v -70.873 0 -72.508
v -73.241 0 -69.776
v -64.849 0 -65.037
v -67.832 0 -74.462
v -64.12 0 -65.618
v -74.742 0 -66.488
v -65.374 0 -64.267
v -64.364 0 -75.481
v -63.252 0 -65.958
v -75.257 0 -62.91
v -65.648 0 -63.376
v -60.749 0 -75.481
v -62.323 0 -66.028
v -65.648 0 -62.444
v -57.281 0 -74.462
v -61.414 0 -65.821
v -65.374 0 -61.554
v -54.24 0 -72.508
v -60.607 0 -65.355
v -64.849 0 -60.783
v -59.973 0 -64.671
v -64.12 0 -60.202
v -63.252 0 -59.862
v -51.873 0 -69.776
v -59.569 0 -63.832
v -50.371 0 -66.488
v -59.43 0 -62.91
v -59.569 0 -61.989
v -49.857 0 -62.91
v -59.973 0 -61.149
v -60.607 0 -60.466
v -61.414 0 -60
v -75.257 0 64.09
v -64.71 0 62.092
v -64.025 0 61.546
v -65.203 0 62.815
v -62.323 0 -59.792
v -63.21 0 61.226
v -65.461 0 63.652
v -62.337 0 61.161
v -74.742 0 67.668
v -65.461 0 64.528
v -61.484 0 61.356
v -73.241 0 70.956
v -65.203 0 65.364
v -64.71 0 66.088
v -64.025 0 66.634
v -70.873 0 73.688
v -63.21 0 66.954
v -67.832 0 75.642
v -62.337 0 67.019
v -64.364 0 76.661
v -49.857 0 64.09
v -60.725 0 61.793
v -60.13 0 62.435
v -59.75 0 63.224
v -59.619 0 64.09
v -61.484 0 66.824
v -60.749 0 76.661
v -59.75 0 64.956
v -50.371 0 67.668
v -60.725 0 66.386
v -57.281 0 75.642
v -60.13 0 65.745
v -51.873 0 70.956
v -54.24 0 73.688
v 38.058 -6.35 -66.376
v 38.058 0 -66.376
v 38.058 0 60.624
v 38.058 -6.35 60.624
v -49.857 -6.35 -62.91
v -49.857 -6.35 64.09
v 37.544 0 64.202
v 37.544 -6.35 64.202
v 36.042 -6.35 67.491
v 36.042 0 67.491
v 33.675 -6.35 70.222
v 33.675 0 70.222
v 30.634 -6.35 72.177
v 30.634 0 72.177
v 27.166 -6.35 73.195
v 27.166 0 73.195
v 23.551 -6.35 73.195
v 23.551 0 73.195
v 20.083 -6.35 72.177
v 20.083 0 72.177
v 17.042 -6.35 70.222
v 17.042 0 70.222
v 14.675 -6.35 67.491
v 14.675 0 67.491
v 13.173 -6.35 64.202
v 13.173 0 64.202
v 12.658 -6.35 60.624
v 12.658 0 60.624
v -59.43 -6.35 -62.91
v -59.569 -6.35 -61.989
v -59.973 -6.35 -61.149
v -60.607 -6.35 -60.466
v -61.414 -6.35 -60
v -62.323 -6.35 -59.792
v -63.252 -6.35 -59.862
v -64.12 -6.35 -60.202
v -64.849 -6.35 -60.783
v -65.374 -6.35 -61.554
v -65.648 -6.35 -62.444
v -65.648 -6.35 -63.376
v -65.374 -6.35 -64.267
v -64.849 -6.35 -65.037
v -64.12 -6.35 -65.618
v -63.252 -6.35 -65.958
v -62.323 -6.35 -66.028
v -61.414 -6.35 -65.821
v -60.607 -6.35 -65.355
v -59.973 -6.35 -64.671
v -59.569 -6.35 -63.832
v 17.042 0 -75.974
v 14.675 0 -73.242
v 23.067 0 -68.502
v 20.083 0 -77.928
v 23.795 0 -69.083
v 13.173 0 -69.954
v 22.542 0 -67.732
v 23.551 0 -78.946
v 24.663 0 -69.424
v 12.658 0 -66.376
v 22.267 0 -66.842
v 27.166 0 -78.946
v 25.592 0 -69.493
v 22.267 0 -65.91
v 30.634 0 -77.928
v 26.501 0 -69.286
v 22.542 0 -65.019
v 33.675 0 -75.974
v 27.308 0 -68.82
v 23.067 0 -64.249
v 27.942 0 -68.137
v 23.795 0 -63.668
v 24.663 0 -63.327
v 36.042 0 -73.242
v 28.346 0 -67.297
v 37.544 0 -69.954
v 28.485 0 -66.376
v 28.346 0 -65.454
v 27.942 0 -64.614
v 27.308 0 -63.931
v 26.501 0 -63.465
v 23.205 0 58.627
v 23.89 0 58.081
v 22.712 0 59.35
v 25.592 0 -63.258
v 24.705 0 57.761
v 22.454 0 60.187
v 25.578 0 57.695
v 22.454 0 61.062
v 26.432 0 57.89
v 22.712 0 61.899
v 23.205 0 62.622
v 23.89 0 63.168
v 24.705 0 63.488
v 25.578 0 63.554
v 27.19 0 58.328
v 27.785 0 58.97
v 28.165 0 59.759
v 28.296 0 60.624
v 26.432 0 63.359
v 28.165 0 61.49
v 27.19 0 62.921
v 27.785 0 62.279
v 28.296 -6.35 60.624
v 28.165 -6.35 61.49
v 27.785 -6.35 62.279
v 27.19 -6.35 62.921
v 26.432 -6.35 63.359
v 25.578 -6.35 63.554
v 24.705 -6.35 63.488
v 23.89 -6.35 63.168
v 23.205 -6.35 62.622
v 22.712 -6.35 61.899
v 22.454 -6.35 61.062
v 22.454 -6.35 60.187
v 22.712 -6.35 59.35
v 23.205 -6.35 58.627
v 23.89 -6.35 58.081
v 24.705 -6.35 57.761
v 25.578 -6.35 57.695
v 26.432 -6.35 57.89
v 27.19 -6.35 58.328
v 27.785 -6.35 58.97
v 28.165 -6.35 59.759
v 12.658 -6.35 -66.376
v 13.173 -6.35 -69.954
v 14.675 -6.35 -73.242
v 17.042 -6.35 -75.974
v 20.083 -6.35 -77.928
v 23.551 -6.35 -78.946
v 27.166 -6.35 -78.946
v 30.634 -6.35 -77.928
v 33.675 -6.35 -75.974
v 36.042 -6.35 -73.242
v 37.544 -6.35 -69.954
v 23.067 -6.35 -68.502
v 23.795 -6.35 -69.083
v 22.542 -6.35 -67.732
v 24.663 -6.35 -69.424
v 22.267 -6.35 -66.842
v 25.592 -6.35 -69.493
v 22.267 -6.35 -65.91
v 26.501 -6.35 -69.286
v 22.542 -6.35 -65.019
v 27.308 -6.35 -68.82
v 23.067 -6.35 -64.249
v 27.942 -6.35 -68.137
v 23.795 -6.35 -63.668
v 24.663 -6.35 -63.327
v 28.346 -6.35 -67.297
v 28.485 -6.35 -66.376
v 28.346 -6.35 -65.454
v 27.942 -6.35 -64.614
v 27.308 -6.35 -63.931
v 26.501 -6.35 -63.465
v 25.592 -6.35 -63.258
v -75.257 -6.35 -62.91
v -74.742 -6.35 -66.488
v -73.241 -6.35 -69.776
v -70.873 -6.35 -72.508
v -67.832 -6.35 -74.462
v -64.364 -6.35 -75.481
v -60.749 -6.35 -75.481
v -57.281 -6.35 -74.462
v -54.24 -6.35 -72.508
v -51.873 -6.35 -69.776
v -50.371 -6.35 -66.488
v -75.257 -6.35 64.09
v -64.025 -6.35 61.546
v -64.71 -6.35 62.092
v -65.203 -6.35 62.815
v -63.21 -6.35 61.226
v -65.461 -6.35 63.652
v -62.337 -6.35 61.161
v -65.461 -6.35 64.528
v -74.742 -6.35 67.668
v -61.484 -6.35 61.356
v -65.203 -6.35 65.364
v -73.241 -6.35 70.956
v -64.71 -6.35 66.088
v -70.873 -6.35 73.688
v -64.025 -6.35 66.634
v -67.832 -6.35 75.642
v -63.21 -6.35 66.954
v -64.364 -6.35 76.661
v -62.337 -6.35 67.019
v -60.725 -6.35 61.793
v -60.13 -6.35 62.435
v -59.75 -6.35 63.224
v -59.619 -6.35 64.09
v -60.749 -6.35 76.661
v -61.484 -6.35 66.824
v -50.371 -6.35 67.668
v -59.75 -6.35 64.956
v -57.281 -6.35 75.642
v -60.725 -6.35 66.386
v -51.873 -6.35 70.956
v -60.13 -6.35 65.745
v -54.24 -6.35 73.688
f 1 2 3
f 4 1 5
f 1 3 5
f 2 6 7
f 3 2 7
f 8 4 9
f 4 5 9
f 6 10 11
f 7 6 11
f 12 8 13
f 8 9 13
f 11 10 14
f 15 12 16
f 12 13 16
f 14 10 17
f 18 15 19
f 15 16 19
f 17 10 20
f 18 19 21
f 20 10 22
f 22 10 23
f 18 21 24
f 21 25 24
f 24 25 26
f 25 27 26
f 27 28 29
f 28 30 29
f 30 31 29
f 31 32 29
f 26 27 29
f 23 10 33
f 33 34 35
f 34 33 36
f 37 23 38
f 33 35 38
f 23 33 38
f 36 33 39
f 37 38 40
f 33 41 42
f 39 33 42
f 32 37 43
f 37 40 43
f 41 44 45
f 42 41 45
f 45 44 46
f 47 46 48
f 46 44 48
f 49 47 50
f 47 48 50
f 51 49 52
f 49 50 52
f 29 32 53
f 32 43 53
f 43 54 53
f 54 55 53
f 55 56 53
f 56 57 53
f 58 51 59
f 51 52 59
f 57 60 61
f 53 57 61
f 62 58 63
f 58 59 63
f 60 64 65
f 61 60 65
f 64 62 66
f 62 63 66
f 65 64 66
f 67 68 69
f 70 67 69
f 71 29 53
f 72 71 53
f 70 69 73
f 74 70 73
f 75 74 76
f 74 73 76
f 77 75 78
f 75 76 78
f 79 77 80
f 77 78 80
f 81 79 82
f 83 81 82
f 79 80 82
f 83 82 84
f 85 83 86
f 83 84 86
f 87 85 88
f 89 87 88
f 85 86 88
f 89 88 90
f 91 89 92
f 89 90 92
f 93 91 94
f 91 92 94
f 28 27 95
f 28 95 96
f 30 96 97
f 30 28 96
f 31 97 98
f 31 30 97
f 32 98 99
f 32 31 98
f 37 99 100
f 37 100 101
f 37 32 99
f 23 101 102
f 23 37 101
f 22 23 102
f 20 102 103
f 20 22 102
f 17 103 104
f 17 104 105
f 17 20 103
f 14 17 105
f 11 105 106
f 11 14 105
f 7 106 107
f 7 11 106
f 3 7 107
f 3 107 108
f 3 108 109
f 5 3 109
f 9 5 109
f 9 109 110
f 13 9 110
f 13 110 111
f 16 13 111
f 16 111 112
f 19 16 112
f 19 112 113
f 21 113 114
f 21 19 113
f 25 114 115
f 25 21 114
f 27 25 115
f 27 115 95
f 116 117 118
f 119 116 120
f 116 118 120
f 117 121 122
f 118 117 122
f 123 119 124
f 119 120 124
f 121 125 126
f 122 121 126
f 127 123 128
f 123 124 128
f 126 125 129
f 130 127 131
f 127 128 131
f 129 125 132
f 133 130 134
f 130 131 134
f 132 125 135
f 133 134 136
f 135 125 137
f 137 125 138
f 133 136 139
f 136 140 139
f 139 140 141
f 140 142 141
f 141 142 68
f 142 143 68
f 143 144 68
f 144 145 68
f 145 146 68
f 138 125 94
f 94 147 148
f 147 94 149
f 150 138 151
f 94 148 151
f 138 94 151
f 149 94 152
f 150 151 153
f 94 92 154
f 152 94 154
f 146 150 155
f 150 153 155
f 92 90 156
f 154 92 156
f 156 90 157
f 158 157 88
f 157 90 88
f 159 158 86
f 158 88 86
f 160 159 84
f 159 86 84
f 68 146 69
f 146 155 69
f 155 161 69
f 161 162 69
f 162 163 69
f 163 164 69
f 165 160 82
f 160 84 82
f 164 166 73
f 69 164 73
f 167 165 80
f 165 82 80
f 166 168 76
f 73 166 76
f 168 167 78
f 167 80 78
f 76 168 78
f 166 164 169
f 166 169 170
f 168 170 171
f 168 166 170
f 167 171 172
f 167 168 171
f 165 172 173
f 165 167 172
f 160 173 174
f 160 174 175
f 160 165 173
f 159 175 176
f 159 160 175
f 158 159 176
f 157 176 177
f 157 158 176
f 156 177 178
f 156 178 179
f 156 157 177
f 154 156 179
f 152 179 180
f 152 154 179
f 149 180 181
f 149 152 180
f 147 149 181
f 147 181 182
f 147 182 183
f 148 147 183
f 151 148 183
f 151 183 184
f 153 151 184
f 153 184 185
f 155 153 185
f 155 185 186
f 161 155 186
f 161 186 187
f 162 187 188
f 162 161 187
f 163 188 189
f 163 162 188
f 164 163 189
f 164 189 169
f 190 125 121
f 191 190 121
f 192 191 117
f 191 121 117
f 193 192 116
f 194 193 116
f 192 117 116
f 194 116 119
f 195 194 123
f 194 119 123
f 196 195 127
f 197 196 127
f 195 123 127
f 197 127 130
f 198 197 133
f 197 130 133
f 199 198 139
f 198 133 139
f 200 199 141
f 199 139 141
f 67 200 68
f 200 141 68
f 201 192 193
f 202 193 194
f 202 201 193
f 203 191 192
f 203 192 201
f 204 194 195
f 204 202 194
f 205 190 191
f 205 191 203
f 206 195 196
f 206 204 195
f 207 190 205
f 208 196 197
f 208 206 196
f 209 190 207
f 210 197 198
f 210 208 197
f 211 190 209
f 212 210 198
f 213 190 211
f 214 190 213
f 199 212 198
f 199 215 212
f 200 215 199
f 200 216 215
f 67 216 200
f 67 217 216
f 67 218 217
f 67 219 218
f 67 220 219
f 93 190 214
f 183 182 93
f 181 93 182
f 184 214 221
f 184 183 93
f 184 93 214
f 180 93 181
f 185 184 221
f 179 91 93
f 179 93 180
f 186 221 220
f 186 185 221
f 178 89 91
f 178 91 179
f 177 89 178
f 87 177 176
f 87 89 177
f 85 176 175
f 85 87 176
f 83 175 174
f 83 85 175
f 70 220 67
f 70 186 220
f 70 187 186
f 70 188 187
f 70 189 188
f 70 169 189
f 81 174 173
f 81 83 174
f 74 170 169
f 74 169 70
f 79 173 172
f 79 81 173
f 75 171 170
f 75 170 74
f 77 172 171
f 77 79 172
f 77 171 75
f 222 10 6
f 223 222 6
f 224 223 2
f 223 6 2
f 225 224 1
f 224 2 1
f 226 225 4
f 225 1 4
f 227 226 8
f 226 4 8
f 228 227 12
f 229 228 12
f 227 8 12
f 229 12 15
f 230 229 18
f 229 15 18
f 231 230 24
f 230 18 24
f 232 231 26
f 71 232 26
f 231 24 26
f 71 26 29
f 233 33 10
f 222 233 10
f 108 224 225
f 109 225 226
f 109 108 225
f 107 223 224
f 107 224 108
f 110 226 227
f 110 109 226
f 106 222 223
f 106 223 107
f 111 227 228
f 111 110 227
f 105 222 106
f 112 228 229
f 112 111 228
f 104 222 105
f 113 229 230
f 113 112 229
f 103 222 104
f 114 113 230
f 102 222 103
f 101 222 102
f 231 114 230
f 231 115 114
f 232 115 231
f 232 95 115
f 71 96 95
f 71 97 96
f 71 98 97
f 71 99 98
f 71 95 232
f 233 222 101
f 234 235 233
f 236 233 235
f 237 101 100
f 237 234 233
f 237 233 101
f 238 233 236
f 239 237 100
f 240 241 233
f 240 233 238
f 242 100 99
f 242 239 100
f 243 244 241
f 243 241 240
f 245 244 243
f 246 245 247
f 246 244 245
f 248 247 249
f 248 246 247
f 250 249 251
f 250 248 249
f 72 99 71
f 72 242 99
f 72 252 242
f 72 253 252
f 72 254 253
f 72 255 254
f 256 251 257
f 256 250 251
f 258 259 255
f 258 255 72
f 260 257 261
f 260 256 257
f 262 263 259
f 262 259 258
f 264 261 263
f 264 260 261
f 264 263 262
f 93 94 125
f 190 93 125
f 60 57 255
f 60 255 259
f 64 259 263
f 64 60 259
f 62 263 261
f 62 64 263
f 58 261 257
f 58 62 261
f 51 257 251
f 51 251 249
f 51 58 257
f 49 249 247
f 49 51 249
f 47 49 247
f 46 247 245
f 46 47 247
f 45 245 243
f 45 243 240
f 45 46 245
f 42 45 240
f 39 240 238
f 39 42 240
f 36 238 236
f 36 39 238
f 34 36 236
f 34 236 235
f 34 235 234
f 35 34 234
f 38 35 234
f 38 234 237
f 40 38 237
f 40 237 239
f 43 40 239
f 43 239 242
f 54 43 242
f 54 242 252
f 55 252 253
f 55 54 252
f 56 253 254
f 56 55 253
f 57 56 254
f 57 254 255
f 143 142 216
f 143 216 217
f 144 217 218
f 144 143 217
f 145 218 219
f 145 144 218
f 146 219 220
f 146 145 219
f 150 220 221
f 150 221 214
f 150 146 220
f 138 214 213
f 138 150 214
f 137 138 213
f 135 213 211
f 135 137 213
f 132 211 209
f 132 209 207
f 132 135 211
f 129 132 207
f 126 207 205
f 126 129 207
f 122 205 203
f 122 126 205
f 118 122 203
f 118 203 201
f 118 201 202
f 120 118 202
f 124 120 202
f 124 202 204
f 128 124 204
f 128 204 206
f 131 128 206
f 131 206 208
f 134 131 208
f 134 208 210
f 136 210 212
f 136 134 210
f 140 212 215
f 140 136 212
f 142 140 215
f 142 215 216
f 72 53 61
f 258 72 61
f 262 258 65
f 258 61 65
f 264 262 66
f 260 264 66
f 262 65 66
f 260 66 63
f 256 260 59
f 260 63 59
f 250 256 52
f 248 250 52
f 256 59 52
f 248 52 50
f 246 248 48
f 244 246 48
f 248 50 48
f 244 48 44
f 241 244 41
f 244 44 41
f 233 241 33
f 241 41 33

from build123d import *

# Parameters (mm, degrees)
F0_R     = 3.126545
F0_R_2   = 2.937388
F1_DEPTH = 6.35


with BuildPart() as f1:
    # F0 (on Front) → F1 (new body)
    with BuildSketch(Plane.XZ):
        with BuildLine():
            ThreePointArc((38.058424, 60.624463), (25.358424, 73.324463), (12.658424, 60.624463))
            Line((12.658424, 60.624463), (12.658424, -66.375537))
            ThreePointArc((12.658424, -66.375537), (25.358424, -79.075537), (38.058424, -66.375537))
            Line((38.058424, -66.375537), (38.058424, 60.624463))
        make_face()
        with Locations((25.358424, -66.375537)):
            Circle(F0_R, mode=Mode.SUBTRACT)
        with Locations((25.358424, 60.624463)):
            Circle(F0_R_2, mode=Mode.SUBTRACT)
        with BuildLine():
            ThreePointArc((-49.85665, 64.089915), (-62.55665, 76.789915), (-75.25665, 64.089915))
            Line((-75.25665, 64.089915), (-75.25665, -62.910085))
            ThreePointArc((-75.25665, -62.910085), (-62.55665, -75.610085), (-49.85665, -62.910085))
            Line((-49.85665, -62.910085), (-49.85665, 64.089915))
        make_face()
        with Locations((-62.55665, -62.910085)):
            Circle(F0_R, mode=Mode.SUBTRACT)
        with Locations((-62.55665, 64.089915)):
            Circle(F0_R_2, mode=Mode.SUBTRACT)
    extrude(amount=F1_DEPTH)


solid = f1.part
